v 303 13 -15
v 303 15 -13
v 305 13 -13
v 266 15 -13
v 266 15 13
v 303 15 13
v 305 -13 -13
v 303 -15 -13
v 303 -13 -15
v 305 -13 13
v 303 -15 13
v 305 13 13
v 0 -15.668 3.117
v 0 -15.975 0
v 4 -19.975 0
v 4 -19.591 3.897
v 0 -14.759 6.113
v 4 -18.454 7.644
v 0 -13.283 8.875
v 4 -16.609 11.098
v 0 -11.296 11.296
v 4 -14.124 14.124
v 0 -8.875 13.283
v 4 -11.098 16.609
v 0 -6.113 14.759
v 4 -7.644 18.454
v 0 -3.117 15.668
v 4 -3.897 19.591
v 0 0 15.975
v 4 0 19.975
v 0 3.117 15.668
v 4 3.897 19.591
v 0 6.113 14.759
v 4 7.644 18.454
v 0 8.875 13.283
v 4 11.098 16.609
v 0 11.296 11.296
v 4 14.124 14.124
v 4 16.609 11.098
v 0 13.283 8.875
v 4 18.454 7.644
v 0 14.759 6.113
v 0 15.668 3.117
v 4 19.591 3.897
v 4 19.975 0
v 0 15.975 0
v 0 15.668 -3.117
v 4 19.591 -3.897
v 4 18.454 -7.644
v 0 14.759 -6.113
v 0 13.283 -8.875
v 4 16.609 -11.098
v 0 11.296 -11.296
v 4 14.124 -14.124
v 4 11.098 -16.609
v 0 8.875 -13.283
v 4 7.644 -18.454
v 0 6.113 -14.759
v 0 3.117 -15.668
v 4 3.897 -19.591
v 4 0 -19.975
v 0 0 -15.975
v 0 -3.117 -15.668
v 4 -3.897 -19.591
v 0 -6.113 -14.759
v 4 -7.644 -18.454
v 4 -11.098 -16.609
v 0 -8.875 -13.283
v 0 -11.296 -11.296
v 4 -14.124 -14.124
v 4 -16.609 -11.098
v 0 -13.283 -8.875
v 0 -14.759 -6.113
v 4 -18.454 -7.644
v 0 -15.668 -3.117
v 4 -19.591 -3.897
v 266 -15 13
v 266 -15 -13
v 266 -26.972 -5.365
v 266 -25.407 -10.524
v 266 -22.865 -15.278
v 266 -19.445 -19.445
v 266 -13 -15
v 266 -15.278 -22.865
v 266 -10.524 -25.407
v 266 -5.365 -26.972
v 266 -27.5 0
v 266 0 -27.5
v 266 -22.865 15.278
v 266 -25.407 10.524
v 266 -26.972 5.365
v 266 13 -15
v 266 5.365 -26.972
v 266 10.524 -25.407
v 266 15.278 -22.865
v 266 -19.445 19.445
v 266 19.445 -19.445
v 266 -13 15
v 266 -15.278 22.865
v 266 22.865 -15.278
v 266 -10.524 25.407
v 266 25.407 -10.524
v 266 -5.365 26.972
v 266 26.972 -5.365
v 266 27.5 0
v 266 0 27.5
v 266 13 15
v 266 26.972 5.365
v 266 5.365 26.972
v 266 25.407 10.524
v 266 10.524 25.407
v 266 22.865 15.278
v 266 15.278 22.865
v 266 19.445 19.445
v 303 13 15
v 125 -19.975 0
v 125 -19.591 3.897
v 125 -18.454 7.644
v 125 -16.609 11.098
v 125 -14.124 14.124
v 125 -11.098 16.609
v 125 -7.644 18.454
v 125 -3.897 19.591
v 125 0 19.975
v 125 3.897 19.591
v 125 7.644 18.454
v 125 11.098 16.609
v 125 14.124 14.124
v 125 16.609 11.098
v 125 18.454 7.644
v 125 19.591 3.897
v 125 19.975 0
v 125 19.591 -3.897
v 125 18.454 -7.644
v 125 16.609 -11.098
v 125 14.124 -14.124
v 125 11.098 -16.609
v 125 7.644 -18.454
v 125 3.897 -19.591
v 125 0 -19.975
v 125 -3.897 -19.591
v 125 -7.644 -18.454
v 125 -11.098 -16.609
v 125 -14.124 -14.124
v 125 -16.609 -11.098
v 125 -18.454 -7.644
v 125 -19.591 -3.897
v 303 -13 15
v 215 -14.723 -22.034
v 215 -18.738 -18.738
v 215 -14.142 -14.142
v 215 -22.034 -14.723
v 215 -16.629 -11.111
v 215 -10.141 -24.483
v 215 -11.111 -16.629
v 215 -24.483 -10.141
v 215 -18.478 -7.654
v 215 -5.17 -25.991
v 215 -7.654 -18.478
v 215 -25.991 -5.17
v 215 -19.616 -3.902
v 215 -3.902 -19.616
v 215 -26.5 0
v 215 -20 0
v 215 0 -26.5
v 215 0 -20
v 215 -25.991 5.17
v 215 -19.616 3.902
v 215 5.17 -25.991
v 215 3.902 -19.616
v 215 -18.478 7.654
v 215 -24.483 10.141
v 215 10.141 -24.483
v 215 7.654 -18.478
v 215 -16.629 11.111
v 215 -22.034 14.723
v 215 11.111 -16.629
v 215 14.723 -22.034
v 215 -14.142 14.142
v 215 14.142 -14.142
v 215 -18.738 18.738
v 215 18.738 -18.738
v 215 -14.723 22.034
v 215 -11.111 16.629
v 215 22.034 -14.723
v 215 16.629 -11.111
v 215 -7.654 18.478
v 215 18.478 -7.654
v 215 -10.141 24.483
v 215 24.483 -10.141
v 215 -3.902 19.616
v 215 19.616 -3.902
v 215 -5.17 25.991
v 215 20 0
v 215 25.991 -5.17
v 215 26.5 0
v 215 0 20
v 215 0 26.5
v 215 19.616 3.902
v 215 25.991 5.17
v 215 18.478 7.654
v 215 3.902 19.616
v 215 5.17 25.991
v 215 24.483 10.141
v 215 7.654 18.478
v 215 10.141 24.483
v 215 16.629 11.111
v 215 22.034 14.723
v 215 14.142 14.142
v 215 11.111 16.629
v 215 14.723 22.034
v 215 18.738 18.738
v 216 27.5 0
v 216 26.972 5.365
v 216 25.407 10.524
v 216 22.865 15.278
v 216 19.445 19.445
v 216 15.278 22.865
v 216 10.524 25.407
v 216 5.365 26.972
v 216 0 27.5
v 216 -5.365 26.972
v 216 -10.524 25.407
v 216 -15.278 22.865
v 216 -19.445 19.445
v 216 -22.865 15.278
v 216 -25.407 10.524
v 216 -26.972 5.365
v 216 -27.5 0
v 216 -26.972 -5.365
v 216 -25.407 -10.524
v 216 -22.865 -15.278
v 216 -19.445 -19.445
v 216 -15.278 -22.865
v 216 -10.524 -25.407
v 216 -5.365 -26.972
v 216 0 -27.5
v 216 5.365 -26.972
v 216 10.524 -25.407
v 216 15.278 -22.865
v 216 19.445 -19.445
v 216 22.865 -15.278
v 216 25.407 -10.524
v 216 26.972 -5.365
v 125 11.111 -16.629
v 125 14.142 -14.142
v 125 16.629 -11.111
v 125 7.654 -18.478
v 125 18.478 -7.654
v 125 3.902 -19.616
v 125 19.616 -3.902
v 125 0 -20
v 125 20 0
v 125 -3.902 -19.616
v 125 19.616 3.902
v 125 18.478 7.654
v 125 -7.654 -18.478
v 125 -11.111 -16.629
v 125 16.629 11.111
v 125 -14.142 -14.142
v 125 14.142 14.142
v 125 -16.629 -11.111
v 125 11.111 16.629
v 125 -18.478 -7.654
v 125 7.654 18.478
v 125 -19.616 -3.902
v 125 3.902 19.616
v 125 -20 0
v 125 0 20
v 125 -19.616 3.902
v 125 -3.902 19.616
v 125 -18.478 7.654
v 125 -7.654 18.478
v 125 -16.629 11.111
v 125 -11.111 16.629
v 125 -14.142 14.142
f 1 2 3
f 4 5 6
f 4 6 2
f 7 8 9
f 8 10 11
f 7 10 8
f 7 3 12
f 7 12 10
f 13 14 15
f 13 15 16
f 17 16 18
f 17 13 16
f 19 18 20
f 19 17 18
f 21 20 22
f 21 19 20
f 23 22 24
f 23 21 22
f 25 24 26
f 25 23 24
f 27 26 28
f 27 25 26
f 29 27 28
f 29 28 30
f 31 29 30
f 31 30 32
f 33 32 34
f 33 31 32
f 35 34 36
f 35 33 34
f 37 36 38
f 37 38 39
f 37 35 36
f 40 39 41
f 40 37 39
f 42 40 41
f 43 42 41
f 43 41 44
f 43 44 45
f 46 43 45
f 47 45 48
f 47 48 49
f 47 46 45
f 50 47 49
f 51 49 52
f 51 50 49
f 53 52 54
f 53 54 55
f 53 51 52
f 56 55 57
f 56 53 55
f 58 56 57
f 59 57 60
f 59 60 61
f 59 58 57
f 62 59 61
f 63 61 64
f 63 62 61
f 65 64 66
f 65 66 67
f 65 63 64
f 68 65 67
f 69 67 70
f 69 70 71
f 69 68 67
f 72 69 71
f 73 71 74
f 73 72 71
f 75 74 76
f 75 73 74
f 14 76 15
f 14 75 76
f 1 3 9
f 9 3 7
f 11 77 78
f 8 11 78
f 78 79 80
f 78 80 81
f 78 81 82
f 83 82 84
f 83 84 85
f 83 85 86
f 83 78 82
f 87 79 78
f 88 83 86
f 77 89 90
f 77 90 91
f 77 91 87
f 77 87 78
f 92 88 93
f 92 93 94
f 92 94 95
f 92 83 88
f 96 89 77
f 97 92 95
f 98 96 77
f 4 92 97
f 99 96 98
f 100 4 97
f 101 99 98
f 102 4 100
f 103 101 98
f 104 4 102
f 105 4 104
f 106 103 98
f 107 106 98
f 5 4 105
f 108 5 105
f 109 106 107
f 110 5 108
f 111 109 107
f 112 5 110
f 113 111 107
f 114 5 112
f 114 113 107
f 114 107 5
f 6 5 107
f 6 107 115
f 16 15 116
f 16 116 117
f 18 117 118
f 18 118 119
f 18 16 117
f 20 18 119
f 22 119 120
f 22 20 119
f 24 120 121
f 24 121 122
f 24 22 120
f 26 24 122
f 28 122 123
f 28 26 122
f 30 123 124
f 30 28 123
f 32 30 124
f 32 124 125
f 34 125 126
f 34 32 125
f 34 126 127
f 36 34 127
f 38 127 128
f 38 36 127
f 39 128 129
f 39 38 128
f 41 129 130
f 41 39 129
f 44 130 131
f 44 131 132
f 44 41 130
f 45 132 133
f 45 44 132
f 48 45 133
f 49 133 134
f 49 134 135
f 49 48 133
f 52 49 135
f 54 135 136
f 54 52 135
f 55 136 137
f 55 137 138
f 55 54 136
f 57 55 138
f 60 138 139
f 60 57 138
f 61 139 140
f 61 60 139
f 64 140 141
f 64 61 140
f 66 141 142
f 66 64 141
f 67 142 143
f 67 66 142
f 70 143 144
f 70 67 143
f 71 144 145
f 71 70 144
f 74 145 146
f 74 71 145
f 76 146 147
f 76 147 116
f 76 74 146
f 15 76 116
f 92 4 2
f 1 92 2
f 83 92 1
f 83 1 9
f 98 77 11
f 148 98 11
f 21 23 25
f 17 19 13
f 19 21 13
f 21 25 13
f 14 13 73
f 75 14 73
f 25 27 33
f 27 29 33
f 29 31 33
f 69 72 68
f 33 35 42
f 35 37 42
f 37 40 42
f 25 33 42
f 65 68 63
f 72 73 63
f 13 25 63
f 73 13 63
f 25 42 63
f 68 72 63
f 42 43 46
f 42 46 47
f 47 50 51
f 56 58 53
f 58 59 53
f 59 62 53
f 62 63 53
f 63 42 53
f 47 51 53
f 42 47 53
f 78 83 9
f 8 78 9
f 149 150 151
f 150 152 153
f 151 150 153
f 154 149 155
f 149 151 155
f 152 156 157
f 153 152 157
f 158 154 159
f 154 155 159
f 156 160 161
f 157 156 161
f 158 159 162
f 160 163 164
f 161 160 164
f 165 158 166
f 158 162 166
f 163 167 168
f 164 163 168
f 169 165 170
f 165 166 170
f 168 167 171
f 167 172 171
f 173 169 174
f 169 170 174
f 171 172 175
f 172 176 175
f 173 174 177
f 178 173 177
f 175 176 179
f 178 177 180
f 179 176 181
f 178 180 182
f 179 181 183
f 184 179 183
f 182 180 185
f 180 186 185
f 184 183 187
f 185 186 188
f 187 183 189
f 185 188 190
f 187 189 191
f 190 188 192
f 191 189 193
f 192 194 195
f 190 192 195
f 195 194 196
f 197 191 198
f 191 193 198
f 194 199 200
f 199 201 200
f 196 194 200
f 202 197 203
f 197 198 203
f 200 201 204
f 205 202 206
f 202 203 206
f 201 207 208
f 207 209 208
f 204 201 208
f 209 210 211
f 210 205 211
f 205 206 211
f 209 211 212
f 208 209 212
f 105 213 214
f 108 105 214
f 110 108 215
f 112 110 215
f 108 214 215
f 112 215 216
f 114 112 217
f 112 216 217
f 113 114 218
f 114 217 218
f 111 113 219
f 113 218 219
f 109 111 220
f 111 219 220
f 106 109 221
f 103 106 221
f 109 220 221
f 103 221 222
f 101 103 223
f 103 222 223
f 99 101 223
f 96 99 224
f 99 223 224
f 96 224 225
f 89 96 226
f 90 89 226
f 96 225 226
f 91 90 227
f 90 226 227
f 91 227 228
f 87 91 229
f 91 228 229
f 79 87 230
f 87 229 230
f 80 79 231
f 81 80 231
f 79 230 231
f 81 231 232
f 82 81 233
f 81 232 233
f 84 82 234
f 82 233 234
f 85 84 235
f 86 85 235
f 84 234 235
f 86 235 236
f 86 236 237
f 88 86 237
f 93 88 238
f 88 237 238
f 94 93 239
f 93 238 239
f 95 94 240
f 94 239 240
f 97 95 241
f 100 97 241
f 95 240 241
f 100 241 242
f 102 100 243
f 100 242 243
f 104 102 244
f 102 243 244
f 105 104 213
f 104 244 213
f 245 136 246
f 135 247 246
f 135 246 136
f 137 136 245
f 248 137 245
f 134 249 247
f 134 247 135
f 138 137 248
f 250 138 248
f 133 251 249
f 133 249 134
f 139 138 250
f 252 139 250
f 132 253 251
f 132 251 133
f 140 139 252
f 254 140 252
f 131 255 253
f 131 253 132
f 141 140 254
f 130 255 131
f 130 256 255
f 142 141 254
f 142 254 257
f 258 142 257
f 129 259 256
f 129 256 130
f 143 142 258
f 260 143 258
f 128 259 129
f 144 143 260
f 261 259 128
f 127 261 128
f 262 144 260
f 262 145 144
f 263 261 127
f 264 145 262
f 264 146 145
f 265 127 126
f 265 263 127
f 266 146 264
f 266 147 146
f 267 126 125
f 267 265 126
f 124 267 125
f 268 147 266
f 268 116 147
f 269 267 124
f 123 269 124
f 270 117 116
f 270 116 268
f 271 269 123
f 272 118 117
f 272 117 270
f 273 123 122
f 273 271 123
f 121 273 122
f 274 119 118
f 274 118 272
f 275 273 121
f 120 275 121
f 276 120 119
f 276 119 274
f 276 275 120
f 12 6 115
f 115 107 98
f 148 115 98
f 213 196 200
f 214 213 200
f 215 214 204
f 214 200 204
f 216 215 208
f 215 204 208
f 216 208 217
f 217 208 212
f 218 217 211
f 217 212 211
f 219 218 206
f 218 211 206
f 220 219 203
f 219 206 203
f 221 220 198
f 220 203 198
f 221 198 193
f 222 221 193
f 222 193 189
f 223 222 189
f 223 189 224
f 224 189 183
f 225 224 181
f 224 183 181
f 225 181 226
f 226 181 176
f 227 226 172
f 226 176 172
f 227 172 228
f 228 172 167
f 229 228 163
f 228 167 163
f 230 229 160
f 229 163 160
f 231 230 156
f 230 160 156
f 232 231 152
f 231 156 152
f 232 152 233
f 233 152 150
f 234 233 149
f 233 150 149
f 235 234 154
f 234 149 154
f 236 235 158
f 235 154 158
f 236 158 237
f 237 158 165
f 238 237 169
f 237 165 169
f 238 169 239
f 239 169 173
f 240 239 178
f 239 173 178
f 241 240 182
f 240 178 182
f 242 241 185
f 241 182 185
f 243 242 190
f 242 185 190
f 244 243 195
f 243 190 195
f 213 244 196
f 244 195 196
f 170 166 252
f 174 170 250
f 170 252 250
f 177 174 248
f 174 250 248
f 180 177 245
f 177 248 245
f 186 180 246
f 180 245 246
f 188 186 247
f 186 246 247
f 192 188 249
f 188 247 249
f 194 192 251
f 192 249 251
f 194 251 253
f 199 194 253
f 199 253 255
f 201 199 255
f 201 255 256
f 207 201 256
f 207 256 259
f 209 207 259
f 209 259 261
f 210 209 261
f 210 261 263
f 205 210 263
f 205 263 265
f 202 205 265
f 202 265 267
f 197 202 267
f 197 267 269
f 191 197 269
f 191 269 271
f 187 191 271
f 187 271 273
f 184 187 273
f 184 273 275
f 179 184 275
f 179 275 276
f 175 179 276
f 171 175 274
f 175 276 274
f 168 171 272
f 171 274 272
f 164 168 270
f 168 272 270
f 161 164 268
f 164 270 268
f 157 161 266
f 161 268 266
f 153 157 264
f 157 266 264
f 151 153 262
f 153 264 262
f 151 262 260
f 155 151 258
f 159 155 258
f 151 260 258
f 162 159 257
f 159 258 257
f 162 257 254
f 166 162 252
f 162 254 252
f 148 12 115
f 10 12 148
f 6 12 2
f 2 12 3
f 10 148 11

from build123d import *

# Parameters (mm, degrees)
SKETCH_1_R          = 20
EXTRUDE_1_DEPTH     = 215
SKETCH_2_R          = 27.5
EXTRUDE_2_DEPTH     = 51
SKETCH_3_W          = 30
SKETCH_3_H          = 30
EXTRUDE_3_DEPTH     = 39
CHAMFER_2_SIZE      = 1
CHAMFER_3_SIZE      = 2
SKETCH_4_R          = 20
SKETCH_4_R_2        = 19.975
CUT_EXTRUDE_1_DEPTH = 125
CHAMFER_4_SIZE      = 4


with BuildPart() as part:
    # 草图1 → 凸台-拉伸1 (new body)
    with BuildSketch(Plane(origin=(0, 0, 0), x_dir=(0, -1, 0), z_dir=(1, 0, 0))):
        with Locations(Location((0, 0, 0), (0, 0, 90))):
            Circle(SKETCH_1_R)
    extrude(amount=EXTRUDE_1_DEPTH)

    # 草图2 → 凸台-拉伸2 (add)
    with BuildSketch(Plane(origin=(215, 0, 0), x_dir=(0, -1, 0), z_dir=(1, 0, 0))):
        with Locations(Location((0, 0, 0), (0, 0, 180))):
            Circle(SKETCH_2_R)
    extrude(amount=EXTRUDE_2_DEPTH)

    # 草图3 → 凸台-拉伸3 (add)
    with BuildSketch(Plane(origin=(266, 0, 0), x_dir=(0, -1, 0), z_dir=(1, 0, 0))):
        Rectangle(SKETCH_3_W, SKETCH_3_H)
    extrude(amount=EXTRUDE_3_DEPTH)

    # 倒角2
    chamfer_2_edges = [part.edges().sort_by_distance(p)[0] for p in [
        (215, -27.5, 0),
    ]]
    chamfer(chamfer_2_edges, length=CHAMFER_2_SIZE)

    # 倒角3
    chamfer_3_edges = [part.edges().sort_by_distance(p)[0] for p in [
        (285.5, 15, -15),
        (285.5, 15, 15),
        (285.5, -15, 15),
        (285.5, -15, -15),
        (305, 15, 0),
        (305, 0, 15),
        (305, -15, 0),
        (305, 0, -15),
    ]]
    chamfer(chamfer_3_edges, length=CHAMFER_3_SIZE)

    # 草图4 → 切除-拉伸1 (cut)
    with BuildSketch(Plane(origin=(0, 0, 0), x_dir=(0, -1, 0), z_dir=(-1, 0, 0))):
        Circle(SKETCH_4_R)
        Circle(SKETCH_4_R_2, mode=Mode.SUBTRACT)
    extrude(amount=-CUT_EXTRUDE_1_DEPTH, mode=Mode.SUBTRACT)

    # 倒角4
    chamfer_4_edges = [part.edges().sort_by_distance(p)[0] for p in [
        (0, 19.975, 0),
    ]]
    chamfer(chamfer_4_edges, length=CHAMFER_4_SIZE)


solid = part.part
